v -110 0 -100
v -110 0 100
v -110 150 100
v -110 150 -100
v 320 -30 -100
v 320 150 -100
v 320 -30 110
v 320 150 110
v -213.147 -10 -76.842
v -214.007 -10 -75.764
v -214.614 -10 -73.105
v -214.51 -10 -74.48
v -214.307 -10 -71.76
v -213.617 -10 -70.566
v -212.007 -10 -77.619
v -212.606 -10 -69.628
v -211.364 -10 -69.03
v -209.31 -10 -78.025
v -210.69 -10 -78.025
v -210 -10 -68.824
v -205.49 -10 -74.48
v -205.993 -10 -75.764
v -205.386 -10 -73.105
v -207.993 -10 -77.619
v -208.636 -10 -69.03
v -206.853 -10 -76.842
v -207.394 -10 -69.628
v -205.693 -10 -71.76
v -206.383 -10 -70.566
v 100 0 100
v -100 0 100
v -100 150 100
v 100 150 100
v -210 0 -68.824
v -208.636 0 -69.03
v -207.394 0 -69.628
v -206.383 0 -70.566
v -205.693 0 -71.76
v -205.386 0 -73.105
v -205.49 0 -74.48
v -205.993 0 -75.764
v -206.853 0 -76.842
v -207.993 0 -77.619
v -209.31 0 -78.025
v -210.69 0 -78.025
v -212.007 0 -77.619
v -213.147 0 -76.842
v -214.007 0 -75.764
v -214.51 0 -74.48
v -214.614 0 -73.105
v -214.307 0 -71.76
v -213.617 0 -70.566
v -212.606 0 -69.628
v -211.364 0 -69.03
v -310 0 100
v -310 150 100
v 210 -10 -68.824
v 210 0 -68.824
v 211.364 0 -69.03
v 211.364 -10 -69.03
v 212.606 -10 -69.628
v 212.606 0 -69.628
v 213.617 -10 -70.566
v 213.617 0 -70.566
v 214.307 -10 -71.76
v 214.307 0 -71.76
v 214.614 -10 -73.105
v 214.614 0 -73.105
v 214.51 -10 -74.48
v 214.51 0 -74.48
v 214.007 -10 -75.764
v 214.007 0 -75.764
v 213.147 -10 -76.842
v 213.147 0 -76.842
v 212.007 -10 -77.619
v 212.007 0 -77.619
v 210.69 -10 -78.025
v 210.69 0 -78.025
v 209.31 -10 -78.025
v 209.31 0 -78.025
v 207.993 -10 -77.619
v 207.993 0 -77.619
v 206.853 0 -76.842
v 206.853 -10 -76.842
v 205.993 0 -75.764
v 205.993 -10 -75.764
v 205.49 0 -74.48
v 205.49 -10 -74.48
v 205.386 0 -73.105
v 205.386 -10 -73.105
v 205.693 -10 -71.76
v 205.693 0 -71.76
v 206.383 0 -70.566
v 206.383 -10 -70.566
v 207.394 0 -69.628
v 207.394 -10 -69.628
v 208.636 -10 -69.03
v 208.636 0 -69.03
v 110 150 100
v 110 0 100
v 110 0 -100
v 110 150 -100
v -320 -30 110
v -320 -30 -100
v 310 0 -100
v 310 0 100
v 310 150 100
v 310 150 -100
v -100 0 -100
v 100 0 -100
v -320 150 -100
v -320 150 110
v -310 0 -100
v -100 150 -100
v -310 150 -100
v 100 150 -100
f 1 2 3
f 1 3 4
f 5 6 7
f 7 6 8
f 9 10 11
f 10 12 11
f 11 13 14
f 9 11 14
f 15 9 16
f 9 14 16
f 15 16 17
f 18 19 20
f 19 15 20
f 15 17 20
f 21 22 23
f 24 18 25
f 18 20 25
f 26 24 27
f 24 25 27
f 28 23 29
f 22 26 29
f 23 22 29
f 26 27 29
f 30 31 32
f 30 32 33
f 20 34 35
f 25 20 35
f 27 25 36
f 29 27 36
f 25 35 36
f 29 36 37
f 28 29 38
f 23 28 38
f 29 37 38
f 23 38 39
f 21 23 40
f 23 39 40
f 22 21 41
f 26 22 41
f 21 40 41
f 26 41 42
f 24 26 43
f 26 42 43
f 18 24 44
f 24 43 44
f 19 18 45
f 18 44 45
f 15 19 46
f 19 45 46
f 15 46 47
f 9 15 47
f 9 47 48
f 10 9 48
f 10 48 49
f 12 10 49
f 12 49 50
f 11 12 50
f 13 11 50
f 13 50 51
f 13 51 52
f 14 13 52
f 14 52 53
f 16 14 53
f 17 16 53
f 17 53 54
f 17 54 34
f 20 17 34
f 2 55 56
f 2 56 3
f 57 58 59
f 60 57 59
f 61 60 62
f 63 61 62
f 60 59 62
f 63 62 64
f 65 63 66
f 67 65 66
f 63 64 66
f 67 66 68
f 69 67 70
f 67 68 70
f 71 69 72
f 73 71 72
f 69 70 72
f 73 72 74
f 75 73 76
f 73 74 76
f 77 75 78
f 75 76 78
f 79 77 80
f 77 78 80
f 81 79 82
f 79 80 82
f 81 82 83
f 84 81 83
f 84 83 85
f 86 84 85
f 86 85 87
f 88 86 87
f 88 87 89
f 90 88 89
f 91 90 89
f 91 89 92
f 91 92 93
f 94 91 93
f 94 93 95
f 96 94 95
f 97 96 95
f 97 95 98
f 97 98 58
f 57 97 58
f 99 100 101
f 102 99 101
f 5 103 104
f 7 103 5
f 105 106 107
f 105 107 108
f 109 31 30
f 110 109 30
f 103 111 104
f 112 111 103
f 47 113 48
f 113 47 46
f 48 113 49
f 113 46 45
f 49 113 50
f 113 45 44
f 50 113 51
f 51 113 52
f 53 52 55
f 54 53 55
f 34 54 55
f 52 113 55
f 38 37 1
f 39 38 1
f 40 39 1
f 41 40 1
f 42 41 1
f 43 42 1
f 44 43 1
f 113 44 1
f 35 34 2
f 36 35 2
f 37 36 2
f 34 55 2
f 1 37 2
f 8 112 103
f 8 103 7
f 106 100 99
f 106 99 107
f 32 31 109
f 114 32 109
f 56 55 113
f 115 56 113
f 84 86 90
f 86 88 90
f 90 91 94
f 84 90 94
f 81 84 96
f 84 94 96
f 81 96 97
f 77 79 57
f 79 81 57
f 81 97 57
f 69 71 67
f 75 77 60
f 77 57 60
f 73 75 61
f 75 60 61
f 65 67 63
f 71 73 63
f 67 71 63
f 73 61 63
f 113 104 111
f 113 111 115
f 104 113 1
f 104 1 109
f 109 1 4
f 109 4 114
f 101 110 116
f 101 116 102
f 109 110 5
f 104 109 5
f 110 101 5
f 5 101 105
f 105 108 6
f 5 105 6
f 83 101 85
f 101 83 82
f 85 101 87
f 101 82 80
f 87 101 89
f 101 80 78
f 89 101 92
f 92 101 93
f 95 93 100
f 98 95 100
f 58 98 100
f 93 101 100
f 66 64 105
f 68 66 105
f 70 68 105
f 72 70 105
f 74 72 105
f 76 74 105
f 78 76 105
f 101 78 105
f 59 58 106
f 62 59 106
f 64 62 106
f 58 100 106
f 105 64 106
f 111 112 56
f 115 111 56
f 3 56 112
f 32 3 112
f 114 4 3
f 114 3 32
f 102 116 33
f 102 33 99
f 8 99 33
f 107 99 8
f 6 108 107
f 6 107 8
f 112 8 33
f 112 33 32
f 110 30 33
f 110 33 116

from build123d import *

# Parameters (mm, degrees)
CROQUIS1_W              = 640
CROQUIS1_H              = 220
CROQUIS1_W_2            = 200
CROQUIS1_H_2            = 200
SALIENTE_EXTRUIR1_DEPTH = 150
CROQUIS3_W              = 640
CROQUIS3_H              = 220
SALIENTE_EXTRUIR3_DEPTH = 10
CROQUIS4_R              = 4.626495545
CORTAR_EXTRUIR1_DEPTH   = 371.135110466
CROQUIS5_W              = 640
CROQUIS5_H              = 10
CORTAR_EXTRUIR2_DEPTH   = 375.299345444
CROQUIS6_W              = 640
CROQUIS6_H              = 210
SALIENTE_EXTRUIR4_DEPTH = 20


with BuildPart() as part:
    # Croquis1 → Saliente-Extruir1 (new body)
    with BuildSketch(Plane(origin=(0, 0, 0), x_dir=(1, 0, 0), z_dir=(0, 1, 0))):
        Rectangle(CROQUIS1_W, CROQUIS1_H)
        with Locations((-210, 0)):
            Rectangle(CROQUIS1_W_2, CROQUIS1_H_2, mode=Mode.SUBTRACT)
        Rectangle(CROQUIS1_W_2, CROQUIS1_H_2, mode=Mode.SUBTRACT)
        with Locations((210, 0)):
            Rectangle(CROQUIS1_W_2, CROQUIS1_H_2, mode=Mode.SUBTRACT)
    extrude(amount=SALIENTE_EXTRUIR1_DEPTH)

    # Croquis3 → Saliente-Extruir3 (add)
    with BuildSketch(Plane.XZ):
        Rectangle(CROQUIS3_W, CROQUIS3_H)
    extrude(amount=SALIENTE_EXTRUIR3_DEPTH)

    # Croquis4 → Cortar-Extruir1 (cut, through all)
    with BuildSketch(Plane(origin=(0, 0, 0), x_dir=(1, 0, 0), z_dir=(0, 1, 0))):
        with Locations(Location((-210, 73.450625609, 0), (0, 0, 270))):
            Circle(CROQUIS4_R)
        with Locations(Location((210, 73.450625609, 0), (0, 0, 270))):
            Circle(CROQUIS4_R)
    extrude(amount=-CORTAR_EXTRUIR1_DEPTH, mode=Mode.SUBTRACT)

    # Croquis5 → Cortar-Extruir2 (cut, through all)
    with BuildSketch(Plane(origin=(0, 150, 0), x_dir=(1, 0, 0), z_dir=(0, 1, 0))):
        with Locations((0, 105)):
            Rectangle(CROQUIS5_W, CROQUIS5_H)
    extrude(amount=-CORTAR_EXTRUIR2_DEPTH, mode=Mode.SUBTRACT)

    # Croquis6 → Saliente-Extruir4 (add)
    with BuildSketch(Plane.XZ.offset(10)):
        with Locations((0, 5)):
            Rectangle(CROQUIS6_W, CROQUIS6_H)
    extrude(amount=SALIENTE_EXTRUIR4_DEPTH)


solid = part.part
